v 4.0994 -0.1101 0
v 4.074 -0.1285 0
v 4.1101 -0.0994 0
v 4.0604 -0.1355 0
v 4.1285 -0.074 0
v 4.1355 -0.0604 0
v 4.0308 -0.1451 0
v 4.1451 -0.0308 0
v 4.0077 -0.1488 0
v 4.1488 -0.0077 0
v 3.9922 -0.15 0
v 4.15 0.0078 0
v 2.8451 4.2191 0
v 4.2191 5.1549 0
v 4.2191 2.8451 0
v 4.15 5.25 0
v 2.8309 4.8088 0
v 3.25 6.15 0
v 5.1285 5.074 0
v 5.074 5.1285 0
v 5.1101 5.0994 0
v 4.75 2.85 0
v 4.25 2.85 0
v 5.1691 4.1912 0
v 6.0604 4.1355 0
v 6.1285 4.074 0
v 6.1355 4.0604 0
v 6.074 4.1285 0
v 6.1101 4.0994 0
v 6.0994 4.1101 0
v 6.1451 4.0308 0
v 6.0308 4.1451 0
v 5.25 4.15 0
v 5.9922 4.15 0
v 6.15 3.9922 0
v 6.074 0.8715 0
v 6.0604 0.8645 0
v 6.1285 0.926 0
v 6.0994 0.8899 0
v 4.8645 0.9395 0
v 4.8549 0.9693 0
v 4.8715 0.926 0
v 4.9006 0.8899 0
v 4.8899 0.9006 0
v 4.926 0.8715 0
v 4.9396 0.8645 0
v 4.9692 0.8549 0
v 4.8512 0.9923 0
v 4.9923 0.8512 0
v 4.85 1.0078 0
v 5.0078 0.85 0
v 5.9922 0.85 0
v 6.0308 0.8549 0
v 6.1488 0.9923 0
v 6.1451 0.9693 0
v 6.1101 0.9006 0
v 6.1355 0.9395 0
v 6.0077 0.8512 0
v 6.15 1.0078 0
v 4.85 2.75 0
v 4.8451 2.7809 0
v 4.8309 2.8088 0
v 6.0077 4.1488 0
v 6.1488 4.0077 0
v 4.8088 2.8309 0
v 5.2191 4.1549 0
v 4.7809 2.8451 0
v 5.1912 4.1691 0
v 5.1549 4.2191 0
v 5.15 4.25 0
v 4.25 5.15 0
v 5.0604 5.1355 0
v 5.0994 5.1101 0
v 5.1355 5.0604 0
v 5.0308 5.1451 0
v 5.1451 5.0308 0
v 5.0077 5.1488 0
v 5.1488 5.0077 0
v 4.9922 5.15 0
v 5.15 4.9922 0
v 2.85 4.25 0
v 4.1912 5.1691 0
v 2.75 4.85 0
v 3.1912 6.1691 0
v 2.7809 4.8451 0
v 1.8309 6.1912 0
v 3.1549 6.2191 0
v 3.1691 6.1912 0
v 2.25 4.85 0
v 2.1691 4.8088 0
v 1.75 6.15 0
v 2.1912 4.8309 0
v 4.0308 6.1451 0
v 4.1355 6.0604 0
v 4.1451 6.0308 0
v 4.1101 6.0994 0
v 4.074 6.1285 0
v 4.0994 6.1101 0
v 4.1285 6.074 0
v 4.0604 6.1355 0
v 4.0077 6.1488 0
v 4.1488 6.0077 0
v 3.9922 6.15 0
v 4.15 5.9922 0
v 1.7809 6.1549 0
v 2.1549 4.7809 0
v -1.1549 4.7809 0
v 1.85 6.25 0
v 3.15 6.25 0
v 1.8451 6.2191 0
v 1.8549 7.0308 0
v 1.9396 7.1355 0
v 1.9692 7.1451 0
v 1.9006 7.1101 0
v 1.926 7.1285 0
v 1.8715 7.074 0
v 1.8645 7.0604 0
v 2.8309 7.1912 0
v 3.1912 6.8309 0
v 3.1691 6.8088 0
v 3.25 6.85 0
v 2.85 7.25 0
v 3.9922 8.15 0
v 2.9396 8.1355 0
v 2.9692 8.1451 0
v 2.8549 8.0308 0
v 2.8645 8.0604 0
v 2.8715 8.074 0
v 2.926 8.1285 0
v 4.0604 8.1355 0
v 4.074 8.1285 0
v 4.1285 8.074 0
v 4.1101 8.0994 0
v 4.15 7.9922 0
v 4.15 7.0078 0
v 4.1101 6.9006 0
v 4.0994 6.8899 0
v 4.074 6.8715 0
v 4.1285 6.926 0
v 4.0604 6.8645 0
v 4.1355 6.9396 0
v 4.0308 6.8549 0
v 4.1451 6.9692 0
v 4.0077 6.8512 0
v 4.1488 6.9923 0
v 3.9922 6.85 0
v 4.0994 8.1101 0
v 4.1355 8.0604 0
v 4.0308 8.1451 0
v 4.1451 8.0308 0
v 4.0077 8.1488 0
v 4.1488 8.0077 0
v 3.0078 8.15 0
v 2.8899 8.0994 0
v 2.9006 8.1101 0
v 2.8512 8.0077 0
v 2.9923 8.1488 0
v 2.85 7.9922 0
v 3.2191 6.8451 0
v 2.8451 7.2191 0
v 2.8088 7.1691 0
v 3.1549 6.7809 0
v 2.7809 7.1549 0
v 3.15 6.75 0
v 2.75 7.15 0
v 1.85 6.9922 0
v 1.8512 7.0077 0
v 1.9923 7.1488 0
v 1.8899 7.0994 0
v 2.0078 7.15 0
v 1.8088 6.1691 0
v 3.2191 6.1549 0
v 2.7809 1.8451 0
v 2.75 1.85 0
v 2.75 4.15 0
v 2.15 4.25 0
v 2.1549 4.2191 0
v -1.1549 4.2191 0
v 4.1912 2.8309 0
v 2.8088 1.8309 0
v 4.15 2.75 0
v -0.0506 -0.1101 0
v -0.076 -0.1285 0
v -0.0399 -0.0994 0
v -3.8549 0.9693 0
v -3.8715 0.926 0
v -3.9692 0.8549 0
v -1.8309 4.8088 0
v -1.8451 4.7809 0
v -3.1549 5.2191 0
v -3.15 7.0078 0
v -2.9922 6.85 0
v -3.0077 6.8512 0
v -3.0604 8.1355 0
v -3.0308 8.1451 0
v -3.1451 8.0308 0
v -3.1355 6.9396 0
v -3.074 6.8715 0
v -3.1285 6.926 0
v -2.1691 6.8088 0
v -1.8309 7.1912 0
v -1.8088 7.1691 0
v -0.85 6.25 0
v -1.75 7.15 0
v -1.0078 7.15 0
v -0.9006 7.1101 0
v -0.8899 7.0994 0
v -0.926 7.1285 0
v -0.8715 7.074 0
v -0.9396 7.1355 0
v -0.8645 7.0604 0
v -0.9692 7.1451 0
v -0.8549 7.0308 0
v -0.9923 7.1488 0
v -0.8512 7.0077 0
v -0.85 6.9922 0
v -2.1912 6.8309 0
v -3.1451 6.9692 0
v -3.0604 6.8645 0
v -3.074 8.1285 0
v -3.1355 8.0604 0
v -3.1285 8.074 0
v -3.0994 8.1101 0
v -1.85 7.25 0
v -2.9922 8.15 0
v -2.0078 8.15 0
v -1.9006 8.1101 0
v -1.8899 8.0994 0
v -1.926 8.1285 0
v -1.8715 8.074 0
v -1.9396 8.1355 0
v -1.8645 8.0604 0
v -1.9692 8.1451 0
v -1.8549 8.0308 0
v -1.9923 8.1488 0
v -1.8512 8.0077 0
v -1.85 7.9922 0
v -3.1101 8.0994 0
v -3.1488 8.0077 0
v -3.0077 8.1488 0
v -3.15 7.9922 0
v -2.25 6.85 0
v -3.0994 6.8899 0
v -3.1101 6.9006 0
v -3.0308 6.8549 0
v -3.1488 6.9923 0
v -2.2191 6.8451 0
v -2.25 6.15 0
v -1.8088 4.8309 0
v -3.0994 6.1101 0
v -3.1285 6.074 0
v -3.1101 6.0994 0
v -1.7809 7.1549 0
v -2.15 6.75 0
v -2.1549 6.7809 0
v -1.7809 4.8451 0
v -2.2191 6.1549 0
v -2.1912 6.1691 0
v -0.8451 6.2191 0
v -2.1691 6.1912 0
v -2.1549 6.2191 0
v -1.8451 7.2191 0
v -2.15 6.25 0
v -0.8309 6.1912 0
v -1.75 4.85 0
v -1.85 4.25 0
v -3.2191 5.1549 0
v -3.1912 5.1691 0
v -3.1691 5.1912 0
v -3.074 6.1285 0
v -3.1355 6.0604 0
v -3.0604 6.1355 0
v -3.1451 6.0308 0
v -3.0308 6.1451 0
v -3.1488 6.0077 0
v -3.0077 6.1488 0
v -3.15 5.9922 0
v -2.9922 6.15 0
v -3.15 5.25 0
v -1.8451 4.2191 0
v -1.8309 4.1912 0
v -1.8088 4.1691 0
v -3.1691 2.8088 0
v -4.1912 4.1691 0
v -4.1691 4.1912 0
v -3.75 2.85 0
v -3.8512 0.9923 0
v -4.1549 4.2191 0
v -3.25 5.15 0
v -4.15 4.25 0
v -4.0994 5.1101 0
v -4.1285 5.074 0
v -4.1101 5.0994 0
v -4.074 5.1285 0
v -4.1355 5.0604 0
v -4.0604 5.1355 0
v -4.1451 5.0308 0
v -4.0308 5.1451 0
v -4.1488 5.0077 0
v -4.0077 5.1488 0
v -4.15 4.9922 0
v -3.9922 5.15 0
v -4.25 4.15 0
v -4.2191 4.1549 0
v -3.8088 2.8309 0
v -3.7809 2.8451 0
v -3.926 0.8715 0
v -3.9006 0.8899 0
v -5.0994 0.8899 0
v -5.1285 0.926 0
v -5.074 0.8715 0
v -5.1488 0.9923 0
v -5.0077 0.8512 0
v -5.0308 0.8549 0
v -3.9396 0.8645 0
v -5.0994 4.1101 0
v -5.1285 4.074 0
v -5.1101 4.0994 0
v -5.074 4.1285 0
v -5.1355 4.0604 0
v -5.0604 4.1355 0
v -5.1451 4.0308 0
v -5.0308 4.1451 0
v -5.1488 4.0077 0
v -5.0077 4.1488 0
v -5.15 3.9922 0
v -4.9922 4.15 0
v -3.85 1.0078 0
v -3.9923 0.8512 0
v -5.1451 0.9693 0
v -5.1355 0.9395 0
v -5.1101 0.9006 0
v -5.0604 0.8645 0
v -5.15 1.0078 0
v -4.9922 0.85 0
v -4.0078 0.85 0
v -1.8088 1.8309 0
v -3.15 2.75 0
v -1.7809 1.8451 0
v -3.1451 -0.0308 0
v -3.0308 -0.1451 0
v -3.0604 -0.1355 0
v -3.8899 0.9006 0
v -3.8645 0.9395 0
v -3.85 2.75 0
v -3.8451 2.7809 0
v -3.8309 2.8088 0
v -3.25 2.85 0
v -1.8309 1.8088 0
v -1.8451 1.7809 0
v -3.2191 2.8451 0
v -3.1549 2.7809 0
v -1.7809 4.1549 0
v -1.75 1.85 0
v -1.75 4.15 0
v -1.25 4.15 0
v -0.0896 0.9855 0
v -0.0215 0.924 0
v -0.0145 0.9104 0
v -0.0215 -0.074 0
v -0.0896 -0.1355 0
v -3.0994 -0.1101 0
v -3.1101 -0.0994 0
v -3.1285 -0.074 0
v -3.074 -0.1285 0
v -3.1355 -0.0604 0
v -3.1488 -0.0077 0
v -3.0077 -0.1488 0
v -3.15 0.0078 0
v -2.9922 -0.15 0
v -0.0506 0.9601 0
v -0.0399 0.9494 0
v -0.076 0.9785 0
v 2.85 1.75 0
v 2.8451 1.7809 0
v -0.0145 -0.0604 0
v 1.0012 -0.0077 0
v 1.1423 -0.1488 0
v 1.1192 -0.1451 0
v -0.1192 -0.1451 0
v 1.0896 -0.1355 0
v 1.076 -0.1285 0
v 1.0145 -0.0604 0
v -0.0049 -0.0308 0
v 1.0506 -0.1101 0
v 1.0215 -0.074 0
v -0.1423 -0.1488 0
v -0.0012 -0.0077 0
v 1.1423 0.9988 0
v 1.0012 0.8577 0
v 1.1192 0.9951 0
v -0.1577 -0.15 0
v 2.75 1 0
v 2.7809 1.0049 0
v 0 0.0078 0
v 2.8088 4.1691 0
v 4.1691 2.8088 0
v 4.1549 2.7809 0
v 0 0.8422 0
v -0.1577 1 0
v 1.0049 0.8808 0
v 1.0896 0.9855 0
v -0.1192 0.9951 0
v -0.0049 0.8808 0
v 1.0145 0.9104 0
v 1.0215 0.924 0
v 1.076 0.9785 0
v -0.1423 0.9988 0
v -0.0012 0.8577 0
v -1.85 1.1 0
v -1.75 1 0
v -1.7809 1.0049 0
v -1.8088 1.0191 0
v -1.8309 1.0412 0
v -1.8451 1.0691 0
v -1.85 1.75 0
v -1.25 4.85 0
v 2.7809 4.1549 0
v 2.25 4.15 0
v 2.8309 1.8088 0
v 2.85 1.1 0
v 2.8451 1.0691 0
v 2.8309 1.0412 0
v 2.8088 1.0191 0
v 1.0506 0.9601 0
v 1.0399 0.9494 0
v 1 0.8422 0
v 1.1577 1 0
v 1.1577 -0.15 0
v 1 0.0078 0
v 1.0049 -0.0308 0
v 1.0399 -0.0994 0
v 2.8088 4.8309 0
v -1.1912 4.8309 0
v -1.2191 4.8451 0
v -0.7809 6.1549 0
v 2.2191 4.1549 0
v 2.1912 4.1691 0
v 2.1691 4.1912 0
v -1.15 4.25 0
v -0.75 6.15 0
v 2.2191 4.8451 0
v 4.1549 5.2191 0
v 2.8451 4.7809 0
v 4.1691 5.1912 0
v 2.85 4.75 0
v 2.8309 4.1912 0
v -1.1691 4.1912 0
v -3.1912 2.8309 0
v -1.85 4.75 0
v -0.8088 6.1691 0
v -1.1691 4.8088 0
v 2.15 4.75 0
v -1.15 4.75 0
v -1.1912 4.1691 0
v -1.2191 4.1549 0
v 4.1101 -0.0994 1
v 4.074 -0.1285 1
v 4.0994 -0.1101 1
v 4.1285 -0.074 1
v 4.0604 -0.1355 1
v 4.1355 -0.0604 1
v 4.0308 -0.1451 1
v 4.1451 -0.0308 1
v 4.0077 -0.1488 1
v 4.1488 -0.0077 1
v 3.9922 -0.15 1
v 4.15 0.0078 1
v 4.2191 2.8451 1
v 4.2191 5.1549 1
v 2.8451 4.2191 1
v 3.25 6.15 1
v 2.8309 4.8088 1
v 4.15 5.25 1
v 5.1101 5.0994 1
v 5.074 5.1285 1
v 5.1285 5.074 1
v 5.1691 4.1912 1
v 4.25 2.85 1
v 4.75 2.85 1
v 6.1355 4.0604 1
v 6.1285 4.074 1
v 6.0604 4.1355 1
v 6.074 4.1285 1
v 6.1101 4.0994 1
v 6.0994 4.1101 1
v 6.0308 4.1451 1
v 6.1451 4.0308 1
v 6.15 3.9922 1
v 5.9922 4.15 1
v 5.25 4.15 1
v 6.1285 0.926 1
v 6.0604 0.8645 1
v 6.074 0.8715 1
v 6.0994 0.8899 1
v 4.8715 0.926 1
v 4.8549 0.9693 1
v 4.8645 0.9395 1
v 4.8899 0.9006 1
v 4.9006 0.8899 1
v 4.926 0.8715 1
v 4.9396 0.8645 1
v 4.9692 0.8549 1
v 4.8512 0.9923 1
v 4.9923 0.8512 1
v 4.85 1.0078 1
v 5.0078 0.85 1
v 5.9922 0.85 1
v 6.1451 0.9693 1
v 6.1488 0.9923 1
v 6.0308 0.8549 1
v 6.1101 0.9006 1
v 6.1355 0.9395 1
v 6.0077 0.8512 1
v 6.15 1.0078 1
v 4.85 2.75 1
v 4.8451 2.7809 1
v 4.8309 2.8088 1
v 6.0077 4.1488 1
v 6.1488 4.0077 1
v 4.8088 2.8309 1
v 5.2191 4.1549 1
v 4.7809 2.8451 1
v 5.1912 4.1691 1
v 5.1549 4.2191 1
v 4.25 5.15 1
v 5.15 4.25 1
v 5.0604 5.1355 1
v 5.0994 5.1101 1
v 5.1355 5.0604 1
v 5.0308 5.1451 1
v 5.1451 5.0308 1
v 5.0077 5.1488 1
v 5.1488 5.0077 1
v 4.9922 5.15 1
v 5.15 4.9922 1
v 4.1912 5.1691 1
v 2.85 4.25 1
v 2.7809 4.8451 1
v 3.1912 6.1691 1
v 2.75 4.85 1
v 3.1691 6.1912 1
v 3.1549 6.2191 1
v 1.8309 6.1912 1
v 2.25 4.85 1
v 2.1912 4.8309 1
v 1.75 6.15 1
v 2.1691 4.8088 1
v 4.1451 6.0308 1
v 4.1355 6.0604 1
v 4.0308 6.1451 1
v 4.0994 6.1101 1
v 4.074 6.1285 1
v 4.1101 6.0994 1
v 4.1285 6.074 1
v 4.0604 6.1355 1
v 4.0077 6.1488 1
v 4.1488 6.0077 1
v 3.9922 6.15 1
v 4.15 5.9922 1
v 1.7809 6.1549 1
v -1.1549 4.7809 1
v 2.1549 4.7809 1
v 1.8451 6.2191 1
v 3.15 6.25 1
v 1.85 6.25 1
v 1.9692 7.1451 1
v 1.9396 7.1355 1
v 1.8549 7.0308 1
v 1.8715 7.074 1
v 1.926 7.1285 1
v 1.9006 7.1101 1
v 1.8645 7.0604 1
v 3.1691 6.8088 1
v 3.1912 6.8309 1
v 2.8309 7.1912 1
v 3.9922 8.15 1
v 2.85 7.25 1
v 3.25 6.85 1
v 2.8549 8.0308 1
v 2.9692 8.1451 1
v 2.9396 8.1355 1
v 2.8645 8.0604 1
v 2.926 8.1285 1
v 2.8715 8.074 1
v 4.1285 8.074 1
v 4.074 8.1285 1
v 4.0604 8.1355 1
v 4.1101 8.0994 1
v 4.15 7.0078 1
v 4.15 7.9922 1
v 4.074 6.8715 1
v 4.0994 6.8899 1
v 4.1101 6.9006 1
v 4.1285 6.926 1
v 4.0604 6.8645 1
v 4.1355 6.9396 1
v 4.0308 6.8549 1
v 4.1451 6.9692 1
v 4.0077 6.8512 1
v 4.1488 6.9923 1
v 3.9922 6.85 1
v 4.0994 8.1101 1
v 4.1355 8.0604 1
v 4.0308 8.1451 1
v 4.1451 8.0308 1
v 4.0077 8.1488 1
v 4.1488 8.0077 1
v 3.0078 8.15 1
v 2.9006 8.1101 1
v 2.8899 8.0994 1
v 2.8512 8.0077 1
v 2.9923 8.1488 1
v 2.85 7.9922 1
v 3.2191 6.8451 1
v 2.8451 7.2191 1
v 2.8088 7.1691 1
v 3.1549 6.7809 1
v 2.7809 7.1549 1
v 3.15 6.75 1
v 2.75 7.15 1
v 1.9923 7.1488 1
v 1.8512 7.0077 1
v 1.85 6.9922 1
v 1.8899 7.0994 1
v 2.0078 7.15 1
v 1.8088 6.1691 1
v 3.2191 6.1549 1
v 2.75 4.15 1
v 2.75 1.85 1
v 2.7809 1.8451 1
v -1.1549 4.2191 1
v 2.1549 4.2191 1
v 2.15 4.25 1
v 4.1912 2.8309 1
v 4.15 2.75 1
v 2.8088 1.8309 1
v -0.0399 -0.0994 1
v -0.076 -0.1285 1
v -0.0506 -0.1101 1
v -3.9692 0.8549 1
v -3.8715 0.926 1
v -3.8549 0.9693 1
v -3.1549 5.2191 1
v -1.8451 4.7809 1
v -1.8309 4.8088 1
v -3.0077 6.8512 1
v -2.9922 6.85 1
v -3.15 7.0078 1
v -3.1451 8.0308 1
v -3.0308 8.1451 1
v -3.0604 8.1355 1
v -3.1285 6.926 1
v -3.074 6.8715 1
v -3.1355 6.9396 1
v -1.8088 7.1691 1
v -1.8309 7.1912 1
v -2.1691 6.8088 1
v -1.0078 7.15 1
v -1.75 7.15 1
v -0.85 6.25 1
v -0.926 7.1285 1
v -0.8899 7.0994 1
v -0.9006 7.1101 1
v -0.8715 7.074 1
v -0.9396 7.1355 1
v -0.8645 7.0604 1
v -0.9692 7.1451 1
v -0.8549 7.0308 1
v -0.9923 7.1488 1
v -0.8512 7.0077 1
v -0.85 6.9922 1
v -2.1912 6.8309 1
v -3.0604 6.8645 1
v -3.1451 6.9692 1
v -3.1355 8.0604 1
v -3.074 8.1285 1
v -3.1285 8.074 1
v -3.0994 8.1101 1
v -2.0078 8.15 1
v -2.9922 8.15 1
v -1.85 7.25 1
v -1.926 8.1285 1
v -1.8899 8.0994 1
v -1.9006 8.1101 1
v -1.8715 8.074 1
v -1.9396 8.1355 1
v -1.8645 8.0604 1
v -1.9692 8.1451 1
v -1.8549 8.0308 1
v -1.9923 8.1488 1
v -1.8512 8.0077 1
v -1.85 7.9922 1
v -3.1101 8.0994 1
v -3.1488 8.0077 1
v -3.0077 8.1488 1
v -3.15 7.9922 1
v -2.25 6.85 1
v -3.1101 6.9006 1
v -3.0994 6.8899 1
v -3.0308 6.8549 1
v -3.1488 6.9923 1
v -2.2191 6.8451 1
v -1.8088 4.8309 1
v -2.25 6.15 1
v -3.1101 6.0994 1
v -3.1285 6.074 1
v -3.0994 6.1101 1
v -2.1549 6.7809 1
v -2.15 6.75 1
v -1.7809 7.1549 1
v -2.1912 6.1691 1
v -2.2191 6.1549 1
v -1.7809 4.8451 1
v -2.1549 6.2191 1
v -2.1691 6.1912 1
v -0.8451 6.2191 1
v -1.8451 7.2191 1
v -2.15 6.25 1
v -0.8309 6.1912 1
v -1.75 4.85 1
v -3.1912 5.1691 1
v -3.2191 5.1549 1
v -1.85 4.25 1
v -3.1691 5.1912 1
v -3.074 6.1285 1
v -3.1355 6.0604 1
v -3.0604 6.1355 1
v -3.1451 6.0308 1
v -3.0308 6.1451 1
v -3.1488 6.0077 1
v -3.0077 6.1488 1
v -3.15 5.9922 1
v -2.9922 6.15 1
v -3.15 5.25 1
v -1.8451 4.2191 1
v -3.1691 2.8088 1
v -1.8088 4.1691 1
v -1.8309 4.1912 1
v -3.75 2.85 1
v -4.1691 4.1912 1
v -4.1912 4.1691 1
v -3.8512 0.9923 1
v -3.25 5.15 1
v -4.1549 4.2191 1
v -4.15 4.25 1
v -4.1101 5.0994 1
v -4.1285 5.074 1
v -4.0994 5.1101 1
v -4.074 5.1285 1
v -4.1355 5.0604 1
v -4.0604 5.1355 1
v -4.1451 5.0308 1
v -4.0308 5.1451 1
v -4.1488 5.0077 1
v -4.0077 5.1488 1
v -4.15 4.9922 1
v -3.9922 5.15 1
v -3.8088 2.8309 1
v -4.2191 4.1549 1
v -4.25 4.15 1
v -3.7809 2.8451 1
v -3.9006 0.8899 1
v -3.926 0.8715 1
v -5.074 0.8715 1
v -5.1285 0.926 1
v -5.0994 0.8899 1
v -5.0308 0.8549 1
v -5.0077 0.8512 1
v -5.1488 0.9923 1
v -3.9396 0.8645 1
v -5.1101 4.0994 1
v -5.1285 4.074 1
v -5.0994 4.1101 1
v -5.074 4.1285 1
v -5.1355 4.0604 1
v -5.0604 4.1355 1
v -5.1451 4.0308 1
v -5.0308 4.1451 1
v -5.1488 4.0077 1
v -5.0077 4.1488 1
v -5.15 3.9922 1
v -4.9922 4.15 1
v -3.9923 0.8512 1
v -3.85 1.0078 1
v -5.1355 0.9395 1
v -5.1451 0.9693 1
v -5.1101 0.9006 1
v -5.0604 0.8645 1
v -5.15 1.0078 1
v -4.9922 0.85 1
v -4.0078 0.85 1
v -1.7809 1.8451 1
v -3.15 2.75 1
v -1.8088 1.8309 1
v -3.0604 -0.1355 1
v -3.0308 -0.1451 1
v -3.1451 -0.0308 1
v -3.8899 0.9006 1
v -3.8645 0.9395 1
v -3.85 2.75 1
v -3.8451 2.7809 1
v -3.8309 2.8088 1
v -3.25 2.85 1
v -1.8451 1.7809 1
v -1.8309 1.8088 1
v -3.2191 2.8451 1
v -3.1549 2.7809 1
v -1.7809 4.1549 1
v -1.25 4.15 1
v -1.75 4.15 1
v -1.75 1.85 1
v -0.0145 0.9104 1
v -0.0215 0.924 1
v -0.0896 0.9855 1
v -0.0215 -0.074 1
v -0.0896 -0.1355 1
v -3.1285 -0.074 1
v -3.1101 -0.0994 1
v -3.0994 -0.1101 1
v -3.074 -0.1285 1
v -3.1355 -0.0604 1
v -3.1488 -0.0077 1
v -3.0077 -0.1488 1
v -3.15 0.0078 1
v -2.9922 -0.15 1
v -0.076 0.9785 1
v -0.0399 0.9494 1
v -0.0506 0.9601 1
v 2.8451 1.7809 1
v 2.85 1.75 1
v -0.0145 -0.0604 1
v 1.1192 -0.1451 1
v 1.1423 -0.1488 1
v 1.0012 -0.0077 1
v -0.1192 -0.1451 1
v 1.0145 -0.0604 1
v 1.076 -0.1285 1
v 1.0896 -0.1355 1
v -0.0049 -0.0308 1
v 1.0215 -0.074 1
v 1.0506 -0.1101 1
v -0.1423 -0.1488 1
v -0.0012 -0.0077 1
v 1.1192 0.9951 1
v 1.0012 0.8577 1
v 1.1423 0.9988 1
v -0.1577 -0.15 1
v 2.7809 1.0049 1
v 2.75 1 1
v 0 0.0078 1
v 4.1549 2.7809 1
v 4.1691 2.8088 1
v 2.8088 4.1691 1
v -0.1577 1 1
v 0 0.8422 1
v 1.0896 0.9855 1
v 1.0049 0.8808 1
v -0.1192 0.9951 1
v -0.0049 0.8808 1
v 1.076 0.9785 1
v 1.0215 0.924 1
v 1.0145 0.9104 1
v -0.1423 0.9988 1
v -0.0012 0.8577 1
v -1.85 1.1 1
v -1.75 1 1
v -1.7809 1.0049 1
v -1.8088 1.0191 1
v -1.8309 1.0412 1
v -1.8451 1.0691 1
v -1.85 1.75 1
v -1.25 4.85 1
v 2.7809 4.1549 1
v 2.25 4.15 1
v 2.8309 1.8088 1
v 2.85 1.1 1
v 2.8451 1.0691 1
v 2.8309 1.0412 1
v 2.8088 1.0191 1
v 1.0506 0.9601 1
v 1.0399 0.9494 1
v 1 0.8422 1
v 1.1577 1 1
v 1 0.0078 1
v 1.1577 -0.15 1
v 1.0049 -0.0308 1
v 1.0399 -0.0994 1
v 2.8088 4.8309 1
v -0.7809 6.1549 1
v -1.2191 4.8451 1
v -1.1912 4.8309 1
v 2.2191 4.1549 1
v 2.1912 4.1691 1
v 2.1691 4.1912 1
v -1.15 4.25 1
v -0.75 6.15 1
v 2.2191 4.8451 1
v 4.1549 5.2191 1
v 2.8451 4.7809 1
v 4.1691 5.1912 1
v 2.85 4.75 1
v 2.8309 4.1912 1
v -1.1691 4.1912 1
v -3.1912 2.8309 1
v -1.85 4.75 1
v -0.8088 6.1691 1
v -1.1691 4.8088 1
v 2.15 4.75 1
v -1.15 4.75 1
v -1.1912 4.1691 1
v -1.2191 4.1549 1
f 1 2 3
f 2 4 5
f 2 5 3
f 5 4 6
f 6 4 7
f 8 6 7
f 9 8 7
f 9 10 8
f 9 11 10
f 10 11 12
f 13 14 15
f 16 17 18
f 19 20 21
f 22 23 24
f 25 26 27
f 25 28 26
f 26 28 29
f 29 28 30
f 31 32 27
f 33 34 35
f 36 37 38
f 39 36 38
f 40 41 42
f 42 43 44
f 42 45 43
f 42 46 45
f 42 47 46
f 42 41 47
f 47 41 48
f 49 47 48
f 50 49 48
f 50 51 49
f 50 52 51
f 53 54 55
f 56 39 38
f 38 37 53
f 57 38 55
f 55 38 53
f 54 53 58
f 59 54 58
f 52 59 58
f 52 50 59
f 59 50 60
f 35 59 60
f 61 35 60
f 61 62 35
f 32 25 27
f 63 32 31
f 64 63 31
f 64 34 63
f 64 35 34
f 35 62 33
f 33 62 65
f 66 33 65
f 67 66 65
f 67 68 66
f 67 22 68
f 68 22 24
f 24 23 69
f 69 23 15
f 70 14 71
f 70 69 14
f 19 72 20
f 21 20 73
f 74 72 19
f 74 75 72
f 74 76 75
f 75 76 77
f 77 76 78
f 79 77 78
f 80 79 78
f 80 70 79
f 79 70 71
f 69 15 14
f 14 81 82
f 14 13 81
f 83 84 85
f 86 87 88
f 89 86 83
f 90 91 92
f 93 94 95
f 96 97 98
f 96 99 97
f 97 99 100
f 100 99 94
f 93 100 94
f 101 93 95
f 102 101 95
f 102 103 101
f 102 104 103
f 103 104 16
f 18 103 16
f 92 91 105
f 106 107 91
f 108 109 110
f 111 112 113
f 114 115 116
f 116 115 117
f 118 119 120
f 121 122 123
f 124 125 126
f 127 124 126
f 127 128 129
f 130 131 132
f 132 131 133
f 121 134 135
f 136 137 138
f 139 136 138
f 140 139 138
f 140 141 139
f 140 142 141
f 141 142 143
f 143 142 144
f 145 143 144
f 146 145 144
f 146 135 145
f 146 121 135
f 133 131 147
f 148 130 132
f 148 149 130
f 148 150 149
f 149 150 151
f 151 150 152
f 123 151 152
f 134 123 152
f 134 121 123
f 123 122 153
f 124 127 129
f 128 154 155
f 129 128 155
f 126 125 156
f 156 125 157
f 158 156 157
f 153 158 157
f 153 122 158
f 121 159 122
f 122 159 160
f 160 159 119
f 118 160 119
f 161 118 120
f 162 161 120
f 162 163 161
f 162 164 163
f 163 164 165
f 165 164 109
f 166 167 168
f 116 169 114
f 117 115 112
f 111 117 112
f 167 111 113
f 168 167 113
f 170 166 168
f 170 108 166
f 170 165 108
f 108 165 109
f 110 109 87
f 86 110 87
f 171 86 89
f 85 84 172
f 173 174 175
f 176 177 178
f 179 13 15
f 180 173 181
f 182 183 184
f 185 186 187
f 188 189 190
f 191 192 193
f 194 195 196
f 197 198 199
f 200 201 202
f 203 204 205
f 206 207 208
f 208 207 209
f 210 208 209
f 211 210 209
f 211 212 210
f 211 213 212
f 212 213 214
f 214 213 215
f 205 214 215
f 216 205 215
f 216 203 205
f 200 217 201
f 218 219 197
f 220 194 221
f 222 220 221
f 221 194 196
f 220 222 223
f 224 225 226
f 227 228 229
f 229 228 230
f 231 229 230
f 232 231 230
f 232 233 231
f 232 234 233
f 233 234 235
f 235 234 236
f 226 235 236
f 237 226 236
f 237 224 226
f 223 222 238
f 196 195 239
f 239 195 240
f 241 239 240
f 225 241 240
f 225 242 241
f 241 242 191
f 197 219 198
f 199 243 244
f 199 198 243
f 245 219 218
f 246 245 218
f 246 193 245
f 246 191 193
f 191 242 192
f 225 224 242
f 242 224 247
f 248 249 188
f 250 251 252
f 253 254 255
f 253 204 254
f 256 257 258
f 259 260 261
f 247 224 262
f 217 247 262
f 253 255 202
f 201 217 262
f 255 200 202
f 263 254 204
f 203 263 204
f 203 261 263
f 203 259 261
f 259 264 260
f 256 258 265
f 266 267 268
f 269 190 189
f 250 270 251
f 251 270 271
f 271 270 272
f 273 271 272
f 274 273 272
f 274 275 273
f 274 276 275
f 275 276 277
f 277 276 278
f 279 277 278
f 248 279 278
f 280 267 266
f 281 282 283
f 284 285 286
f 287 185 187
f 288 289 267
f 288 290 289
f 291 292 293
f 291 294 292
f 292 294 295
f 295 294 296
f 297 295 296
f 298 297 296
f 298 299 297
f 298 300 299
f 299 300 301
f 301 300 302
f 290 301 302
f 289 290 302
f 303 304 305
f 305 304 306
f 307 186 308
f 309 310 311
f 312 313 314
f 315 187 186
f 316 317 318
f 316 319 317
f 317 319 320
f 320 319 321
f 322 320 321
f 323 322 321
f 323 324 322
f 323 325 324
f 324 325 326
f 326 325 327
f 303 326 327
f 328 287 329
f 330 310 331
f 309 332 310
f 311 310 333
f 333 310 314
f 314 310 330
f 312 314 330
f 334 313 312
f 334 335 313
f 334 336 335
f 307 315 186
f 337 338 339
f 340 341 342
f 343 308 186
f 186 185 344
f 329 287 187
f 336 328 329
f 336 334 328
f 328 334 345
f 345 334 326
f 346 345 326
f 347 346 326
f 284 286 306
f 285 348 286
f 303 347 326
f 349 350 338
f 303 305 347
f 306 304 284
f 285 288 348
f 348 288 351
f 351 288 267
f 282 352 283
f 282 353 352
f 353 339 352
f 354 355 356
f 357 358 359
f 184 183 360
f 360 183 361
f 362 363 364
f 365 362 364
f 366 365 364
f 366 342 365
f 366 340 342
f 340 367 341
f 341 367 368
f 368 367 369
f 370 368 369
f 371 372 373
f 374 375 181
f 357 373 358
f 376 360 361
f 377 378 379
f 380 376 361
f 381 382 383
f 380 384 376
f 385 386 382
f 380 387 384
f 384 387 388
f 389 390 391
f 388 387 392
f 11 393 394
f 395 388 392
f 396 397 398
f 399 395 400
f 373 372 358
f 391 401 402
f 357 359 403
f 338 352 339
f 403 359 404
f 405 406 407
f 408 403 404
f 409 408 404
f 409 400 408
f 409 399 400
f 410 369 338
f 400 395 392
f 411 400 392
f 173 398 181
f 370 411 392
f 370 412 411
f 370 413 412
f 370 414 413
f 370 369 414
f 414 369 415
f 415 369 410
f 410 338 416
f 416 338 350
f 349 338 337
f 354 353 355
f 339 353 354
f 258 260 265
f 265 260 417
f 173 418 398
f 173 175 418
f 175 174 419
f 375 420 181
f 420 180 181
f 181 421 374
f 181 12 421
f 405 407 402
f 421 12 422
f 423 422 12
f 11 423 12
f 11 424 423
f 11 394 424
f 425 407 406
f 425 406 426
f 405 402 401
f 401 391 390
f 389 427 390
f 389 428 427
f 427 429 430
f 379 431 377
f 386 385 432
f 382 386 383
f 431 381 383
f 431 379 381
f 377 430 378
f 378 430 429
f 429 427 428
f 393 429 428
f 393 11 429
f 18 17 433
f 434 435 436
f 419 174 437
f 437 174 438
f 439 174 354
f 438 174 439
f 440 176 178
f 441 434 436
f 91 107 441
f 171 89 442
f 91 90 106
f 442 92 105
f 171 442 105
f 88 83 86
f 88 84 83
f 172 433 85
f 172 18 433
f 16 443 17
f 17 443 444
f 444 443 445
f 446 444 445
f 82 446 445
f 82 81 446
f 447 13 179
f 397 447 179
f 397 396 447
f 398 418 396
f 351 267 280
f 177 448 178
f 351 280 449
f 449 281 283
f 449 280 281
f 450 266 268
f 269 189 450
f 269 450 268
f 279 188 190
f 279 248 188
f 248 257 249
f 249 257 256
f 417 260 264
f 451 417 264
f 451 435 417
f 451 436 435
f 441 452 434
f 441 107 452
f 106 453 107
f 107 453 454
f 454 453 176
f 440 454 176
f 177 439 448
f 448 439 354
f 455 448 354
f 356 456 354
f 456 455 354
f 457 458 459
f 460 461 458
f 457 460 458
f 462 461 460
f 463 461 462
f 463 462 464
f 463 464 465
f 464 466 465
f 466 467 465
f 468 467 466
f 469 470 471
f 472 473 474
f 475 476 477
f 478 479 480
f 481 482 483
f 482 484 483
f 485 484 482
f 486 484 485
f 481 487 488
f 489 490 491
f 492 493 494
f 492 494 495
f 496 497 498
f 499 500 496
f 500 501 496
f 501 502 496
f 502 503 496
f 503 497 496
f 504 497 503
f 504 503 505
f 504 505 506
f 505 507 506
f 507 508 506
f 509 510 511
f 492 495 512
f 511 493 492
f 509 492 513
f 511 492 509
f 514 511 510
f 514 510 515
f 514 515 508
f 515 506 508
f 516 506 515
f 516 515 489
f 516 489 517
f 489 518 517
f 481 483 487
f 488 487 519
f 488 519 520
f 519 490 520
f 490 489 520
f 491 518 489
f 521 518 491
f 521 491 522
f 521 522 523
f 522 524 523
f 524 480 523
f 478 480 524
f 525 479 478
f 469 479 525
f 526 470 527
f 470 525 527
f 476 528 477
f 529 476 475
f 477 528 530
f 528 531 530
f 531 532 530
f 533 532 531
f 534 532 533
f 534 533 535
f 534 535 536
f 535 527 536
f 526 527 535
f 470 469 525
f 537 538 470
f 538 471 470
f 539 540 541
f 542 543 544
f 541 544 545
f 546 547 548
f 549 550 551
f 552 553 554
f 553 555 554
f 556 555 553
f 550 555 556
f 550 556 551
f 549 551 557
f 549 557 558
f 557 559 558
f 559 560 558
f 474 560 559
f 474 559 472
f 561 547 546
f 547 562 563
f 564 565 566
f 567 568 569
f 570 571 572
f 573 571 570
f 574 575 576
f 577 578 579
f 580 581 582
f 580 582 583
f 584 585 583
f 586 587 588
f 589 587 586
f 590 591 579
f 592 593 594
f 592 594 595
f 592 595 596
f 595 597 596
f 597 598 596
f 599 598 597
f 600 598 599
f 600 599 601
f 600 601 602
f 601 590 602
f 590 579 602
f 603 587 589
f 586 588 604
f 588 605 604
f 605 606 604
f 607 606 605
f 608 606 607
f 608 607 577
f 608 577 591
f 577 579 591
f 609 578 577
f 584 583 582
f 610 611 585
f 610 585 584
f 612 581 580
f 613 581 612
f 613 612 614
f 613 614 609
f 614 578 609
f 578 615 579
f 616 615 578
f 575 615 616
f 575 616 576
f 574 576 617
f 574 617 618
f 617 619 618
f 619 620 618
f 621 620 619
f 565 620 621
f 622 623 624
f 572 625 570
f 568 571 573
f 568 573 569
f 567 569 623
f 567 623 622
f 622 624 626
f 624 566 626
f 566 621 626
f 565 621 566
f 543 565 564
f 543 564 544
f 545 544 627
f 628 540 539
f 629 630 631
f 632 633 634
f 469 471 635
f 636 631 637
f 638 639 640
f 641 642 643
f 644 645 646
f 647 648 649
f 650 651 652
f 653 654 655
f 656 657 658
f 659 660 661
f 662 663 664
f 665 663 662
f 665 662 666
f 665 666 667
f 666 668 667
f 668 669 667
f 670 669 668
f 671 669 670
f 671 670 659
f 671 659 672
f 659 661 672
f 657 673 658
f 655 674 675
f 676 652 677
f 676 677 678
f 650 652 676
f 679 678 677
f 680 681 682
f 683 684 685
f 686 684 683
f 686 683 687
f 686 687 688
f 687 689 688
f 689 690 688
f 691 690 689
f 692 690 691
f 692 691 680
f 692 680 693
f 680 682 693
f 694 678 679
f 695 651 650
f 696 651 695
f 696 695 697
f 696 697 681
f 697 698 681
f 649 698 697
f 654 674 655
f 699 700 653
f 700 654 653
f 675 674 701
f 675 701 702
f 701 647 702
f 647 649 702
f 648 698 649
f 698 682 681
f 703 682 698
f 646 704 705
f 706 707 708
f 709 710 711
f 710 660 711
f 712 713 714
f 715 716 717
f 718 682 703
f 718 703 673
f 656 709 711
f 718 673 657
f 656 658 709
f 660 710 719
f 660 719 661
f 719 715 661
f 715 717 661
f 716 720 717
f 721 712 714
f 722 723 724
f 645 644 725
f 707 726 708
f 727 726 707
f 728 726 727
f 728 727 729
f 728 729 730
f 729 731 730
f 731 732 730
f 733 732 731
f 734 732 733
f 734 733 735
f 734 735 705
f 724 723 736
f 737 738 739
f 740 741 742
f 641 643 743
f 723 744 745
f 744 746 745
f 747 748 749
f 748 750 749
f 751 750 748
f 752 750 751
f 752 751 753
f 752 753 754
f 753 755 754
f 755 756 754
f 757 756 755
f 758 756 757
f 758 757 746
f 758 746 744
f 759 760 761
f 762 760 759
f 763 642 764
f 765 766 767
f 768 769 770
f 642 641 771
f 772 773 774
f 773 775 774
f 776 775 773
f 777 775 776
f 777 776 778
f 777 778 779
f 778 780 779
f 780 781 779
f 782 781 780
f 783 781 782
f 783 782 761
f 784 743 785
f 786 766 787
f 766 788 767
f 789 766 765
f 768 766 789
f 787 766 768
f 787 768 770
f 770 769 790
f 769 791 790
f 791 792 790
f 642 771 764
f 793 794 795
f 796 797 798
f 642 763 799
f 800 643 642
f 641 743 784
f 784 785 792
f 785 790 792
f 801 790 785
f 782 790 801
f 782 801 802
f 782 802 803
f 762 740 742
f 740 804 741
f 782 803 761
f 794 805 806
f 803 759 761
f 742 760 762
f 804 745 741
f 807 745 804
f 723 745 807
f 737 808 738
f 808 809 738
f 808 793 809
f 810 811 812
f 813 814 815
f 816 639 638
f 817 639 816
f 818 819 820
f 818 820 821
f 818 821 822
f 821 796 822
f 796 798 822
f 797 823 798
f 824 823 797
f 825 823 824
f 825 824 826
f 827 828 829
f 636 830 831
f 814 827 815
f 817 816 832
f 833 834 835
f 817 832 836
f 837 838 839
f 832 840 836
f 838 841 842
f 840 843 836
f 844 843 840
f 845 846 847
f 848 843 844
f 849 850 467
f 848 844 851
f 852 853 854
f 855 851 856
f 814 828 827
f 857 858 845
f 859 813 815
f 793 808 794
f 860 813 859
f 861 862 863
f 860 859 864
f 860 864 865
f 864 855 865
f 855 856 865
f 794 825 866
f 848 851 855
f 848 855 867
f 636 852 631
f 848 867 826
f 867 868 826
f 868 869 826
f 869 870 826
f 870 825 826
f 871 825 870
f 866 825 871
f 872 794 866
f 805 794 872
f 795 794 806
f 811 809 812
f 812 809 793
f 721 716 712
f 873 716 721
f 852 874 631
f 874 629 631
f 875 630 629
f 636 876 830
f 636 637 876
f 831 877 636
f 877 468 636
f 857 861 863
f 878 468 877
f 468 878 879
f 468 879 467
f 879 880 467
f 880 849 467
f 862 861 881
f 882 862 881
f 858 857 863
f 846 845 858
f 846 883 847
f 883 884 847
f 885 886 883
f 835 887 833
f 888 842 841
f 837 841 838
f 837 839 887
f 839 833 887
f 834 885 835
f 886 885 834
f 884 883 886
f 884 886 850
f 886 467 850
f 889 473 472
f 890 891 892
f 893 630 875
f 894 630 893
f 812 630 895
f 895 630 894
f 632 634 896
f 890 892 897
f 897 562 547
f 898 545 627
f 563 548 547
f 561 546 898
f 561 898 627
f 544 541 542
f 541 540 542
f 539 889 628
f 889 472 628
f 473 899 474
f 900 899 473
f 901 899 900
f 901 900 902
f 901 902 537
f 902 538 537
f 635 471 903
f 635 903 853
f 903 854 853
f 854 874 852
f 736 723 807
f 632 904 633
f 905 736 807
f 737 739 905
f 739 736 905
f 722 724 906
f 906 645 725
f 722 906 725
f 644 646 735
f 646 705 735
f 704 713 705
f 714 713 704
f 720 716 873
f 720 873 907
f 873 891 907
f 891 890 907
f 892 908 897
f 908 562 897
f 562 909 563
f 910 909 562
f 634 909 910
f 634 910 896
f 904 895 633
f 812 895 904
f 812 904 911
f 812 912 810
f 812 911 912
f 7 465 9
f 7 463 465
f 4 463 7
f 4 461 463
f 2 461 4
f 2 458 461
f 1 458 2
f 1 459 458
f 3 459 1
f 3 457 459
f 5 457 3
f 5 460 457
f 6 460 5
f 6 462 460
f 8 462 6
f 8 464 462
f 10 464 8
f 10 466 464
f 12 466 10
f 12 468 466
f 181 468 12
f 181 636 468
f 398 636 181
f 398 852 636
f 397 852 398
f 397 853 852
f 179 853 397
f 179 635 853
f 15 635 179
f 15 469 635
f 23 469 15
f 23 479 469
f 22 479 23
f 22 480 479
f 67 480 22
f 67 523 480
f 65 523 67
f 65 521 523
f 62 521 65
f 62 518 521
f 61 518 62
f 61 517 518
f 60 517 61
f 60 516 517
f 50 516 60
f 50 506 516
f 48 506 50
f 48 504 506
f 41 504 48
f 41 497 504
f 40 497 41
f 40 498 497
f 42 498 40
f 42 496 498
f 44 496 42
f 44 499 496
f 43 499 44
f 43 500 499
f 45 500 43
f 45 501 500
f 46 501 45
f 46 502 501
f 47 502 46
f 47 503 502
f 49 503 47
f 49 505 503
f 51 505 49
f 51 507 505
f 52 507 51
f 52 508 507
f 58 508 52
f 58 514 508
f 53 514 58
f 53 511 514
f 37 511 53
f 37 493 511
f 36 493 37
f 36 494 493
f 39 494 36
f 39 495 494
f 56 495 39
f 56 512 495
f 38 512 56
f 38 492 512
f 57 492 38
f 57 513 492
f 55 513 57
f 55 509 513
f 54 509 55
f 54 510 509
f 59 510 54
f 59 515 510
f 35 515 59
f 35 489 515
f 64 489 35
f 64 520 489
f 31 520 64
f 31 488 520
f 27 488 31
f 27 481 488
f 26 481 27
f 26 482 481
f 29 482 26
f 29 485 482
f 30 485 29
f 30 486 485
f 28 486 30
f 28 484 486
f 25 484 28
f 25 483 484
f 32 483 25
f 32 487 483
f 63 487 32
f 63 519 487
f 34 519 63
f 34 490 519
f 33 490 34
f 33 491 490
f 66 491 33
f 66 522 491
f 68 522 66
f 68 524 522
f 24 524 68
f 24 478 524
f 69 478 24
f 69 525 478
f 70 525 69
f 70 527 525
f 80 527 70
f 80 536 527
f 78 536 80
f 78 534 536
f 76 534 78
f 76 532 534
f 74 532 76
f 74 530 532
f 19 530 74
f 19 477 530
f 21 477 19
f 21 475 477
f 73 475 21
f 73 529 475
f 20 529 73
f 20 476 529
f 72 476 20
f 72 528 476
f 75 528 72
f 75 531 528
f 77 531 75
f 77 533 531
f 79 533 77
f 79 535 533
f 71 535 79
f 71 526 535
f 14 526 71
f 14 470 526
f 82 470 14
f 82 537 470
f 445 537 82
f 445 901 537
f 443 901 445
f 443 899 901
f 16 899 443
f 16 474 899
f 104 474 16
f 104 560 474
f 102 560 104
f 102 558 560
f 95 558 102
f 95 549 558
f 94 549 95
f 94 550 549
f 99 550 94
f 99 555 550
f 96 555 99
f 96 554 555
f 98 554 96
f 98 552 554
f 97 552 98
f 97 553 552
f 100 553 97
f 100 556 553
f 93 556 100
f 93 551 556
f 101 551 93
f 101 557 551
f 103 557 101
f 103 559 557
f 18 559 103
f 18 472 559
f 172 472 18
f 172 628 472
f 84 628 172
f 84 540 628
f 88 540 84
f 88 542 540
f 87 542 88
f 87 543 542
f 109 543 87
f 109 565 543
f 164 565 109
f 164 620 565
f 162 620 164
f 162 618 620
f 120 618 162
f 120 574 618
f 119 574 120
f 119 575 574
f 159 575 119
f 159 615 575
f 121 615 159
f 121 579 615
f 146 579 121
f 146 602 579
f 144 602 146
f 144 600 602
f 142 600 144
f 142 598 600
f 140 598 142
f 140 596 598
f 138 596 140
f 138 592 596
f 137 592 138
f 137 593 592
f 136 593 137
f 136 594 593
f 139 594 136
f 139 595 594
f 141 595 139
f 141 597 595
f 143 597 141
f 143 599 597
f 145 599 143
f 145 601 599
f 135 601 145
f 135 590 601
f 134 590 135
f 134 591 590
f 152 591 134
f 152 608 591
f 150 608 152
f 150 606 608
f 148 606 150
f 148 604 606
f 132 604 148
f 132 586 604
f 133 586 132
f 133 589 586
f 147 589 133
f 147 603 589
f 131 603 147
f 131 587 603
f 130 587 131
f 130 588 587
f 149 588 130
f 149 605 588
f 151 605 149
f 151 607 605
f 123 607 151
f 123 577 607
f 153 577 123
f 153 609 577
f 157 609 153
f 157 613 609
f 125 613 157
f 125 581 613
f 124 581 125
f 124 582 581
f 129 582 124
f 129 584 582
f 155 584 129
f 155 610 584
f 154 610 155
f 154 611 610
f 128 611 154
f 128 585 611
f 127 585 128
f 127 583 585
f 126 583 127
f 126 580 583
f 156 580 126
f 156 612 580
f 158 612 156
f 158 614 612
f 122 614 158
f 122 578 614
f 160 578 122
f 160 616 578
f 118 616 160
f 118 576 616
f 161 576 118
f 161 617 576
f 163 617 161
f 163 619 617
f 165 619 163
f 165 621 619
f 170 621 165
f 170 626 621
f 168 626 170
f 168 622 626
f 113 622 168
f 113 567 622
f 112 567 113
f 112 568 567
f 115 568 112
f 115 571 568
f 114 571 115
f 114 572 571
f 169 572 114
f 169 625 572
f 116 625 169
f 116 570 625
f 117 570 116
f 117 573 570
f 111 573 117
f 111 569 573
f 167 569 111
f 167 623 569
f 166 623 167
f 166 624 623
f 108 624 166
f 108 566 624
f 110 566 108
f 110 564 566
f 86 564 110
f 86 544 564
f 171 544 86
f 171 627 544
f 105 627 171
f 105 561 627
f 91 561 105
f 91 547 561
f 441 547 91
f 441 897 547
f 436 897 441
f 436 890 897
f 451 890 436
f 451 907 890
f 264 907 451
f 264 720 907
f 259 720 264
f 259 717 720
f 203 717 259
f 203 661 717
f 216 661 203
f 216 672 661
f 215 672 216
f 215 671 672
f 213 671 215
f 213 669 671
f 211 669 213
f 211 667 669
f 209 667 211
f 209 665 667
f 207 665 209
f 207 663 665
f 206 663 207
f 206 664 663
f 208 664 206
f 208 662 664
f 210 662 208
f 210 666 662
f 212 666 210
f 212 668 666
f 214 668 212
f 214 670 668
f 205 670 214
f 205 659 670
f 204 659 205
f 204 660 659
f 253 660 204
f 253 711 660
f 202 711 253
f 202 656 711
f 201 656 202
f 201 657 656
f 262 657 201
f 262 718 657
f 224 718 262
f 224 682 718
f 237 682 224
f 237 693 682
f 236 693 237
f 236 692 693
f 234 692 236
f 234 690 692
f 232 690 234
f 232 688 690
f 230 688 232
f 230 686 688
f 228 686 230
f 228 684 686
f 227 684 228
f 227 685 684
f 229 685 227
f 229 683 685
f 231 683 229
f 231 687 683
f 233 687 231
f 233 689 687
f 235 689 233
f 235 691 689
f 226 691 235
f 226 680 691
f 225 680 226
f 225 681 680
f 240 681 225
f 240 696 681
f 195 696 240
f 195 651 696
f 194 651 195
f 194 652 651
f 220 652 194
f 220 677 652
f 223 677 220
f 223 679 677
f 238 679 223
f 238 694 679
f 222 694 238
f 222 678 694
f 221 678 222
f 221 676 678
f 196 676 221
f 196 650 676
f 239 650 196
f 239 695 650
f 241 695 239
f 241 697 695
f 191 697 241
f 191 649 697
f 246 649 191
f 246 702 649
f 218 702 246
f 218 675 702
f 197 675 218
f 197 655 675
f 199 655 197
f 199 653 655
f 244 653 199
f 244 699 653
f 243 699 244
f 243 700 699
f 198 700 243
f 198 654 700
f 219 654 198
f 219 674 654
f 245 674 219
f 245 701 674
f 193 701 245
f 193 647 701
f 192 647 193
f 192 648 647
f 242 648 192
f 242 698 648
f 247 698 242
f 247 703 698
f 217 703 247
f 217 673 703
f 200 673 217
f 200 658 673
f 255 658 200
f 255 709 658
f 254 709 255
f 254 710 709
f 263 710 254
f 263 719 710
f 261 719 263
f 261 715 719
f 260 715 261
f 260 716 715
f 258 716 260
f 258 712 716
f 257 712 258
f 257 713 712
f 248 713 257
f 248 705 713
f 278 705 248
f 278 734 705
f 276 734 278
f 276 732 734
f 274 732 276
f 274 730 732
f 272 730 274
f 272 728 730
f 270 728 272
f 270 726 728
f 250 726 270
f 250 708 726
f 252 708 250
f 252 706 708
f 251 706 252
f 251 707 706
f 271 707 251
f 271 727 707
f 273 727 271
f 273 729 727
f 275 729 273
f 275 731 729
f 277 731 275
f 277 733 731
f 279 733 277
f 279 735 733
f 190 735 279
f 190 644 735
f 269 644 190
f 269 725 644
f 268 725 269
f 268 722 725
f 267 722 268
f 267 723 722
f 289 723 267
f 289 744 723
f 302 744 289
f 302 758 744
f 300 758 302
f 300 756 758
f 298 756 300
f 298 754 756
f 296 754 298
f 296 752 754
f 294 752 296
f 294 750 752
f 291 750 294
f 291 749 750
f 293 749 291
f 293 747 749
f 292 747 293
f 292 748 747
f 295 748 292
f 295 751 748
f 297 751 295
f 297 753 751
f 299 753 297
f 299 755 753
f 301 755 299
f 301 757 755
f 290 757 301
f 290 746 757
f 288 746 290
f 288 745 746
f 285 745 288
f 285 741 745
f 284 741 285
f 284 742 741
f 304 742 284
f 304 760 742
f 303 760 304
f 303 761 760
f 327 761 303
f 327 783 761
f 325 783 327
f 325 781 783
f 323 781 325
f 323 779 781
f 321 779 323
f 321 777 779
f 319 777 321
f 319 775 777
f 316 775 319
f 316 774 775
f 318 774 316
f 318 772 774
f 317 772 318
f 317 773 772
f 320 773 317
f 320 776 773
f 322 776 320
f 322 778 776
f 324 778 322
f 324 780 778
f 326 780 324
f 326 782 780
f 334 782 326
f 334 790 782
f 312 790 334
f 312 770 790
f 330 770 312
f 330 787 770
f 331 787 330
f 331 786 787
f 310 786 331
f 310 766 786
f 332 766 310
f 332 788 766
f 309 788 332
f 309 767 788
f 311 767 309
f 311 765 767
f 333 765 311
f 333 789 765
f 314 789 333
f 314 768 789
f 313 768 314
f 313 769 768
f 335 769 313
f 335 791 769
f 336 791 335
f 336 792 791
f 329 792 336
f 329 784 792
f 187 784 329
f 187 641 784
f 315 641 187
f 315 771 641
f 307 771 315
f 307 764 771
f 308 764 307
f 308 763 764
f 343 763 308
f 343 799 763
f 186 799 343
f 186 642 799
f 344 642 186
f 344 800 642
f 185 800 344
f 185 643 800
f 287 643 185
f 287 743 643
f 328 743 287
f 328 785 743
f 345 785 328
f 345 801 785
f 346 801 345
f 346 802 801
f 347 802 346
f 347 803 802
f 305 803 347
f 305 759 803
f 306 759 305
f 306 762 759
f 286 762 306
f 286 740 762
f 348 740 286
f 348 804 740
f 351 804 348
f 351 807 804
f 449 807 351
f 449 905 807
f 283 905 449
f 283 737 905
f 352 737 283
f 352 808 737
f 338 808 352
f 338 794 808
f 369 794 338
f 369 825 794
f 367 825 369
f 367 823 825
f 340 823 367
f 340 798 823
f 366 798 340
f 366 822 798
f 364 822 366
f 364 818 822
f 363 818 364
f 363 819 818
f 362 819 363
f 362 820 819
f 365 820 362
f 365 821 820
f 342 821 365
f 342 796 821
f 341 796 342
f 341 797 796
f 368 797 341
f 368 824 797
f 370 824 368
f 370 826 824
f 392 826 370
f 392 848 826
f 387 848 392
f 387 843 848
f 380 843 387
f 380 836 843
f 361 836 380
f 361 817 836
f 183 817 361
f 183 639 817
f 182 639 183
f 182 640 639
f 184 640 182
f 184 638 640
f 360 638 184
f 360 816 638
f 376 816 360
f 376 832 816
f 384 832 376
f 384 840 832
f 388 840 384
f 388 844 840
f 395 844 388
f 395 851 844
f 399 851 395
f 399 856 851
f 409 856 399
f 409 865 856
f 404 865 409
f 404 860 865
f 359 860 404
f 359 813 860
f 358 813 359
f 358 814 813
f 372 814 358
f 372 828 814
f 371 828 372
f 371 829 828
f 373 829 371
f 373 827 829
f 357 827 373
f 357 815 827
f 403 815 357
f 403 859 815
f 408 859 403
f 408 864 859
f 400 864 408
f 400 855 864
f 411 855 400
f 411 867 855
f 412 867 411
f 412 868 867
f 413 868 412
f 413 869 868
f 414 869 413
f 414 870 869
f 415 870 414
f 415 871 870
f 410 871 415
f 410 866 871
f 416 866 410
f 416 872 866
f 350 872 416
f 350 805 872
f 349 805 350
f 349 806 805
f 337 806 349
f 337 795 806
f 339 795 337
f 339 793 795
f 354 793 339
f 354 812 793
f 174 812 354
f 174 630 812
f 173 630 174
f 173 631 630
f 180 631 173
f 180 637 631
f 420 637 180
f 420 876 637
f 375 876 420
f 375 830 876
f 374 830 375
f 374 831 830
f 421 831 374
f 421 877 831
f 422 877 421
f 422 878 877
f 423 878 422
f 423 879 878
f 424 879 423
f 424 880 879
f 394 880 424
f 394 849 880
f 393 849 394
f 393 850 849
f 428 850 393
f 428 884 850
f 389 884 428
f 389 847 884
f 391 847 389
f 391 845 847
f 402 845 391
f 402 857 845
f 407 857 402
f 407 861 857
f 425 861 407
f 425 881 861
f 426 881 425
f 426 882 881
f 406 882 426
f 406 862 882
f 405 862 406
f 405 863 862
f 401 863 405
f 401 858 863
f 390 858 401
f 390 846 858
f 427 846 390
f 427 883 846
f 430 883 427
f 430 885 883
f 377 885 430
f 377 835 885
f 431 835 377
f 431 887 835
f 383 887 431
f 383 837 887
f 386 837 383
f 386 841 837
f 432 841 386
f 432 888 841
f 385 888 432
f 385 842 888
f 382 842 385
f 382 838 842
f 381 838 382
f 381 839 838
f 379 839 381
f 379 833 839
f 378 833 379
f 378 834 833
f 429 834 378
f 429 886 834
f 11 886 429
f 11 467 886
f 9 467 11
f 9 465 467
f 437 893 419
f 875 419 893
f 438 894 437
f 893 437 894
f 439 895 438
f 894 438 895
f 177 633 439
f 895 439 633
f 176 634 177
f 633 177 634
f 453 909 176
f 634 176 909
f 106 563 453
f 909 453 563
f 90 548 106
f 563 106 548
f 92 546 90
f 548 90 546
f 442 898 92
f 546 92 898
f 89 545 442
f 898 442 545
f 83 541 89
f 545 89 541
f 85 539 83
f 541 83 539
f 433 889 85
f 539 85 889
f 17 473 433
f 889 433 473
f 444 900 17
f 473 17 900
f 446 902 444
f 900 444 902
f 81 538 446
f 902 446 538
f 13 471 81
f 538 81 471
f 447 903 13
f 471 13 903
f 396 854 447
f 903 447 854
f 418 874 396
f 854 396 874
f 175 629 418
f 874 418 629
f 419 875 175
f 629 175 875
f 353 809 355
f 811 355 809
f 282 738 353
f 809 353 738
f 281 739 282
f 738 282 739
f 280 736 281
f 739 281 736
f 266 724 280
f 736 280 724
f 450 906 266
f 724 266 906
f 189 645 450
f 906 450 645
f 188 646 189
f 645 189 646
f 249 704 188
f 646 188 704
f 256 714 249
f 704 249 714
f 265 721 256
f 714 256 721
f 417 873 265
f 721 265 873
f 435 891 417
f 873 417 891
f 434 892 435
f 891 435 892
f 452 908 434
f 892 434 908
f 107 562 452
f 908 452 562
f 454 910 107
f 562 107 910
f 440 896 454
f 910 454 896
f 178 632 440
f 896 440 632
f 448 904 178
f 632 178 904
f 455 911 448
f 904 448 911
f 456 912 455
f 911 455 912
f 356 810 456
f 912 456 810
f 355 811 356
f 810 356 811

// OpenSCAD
/*
    Red-Sprite logo in 3D
    https://www.meetup.com/Red-Sprite/
    Author: kevin@kgolding.co.uk
*/

$fn = 20;           // Smoothness
overlap = 0.15;     // Overlap of the virtual squares that the logo is made up from
rounding = 0.1;     // Rounding of square corners
view = "Default";   // ["Default", "Grid", "Half", "Whole", "Rounded"]

// View switcher, so that one can quickly change what is displayed using the customizer
if (view == "Default") {
    RedSpritePadded();
} else if (view == "Grid") {
    Grid();
} else if (view == "Half") {
    Half();
    Grid();
} else if (view == "Whole") {
    Whole();
    Grid();
} else if (view == "Rounded") {
    RedSpritePadded();
    Grid();
}

// Half() draws half of the RedSprite logo, by first drawing a body
// and then cutting out the bits we don't want
module Half() {
    difference() {
        // The body, which we cut out what we don't want
        // Prefix with ! to only show this item
        square([6,8]);
        
        // Eye(s)
        translate([2,4,0]) square([1,1]);

        // Leg(s)
        translate([4,0,0]) square([1,3]);
        translate([5,0,0]) square([1,1]);

        // Sid(e)
        translate([5,4,0]) square([1,1]);
        translate([4,5,0]) square([2,1]);
        translate([3,6,0]) square([3,1]);

        // Ear(s)
        translate([0,6,0]) square([2,1]);
        translate([0,7,0]) square([3,1]);
        translate([3,6,0]) square([3,1]);
        translate([4,7,0]) square([2,1]);

        // Mouth, which breaks from the regular square size as it need to look
        // a little more open!
        square([1+overlap,1]);
        translate([0,1-overlap,0]) square([3,1+overlap]);
    }
}

// Whole() combines two halfs, one mirrored and overlapped by half a square
// to get the middle section a little narrower
module Whole() {
    union() {
        Half();
        mirror([1,0,0])
            translate([-1,0,0])
                Half();
    };
}

// RedSpriteOverlapRounded uses minkowski to increase the size of the shape
// by outlining it with circle around, making it fatter and joining
// the squares where they are diagonally related, and then applies 
// rounding using the Polyround module
module RedSpriteOverlapRounded() {
    Polyround(rounding) {
        minkowski() {
            Whole();
            circle(overlap);
        }
    }
}

// RedSpritePadded takes our 2D shape and colors it red and extrudes (aka pads)
// it into a 3D model
module RedSpritePadded() {
    color("red")
        linear_extrude(1)
            RedSpriteOverlapRounded();    
}

// Hidden extras
// Scaling whilst extruding to give a angled effect
*translate([0,15,0]) linear_extrude(4, scale=0.8) translate([0,-4,0]) RedSpriteOverlapRounded();

// grid draws a checker background and x/y axises to help
// talk through the design process
module Grid() {
    Xmin = -5;
    Xmax = 5;
    Ymin = 0;
    Ymax = 7;
    textPad = 0.25;
    textSize = 1 - 2 * textPad;
    
    // Show grid behind model
    color("black", 0.2) translate([0,0,-0.1]) linear_extrude(0.1) {
        // Legends
        color("black") translate([(Xmax+Xmin)/2+textPad,Ymax+2,0])
            text(text="X", size=textSize, valign="baseline");
        color("black") translate([Xmax+2,(Ymax+Ymin)/2+textPad,0])
            text(text="Y", size=textSize, valign="baseline");
        
        for (x = [Xmin:Xmax]) {
            for (y = [Ymin:Ymax]) {
                // X Axises
                if (y == Ymin) {
                    color("black", 0.5) translate([x+textPad,Ymax+1+textPad,0])
                        text(text=str(x), size=textSize, valign="bottom");
                }
                // Y Axises
                if (x == Xmax) {
                    color("black", 0.5) translate([Xmax+1+textPad,y+textPad,0])
                        text(text=str(y), size=textSize, valign="bottom");
                }
                // Checker background
                if ((x + y % 2 )% 2 == 0) {
                    color("silver", 0.2) translate([x,y,0]) square(1);
                }
            }
        }
    }
}

// Polyround rounds a given shape by a given radius, optionally
// by either inside and outside (default is both)
module Polyround(radius,inside=true,outside=true){
// src https://www.reddit.com/r/openscad/comments/ji30g3/comment/ga6n7aa/?utm_source=share&utm_medium=web3x&utm_name=web3xcss&utm_term=1&utm_content=share_button
	if (inside == true){
		if (outside == true){
			// Inside corners
			offset(r=-radius)
			offset(delta=radius)
			// Outside corners
			offset(r=radius)
			offset(delta=-radius)
			children();
		} else {
			// Inside corners
			offset(r=-radius)
			offset(delta=radius)
			children();
		}
	} else {
		if (outside == true) {
			// Outside corners
			offset(r=radius)
			offset(delta=-radius)
			children();
		} else {
			children();
		}
	}
}
